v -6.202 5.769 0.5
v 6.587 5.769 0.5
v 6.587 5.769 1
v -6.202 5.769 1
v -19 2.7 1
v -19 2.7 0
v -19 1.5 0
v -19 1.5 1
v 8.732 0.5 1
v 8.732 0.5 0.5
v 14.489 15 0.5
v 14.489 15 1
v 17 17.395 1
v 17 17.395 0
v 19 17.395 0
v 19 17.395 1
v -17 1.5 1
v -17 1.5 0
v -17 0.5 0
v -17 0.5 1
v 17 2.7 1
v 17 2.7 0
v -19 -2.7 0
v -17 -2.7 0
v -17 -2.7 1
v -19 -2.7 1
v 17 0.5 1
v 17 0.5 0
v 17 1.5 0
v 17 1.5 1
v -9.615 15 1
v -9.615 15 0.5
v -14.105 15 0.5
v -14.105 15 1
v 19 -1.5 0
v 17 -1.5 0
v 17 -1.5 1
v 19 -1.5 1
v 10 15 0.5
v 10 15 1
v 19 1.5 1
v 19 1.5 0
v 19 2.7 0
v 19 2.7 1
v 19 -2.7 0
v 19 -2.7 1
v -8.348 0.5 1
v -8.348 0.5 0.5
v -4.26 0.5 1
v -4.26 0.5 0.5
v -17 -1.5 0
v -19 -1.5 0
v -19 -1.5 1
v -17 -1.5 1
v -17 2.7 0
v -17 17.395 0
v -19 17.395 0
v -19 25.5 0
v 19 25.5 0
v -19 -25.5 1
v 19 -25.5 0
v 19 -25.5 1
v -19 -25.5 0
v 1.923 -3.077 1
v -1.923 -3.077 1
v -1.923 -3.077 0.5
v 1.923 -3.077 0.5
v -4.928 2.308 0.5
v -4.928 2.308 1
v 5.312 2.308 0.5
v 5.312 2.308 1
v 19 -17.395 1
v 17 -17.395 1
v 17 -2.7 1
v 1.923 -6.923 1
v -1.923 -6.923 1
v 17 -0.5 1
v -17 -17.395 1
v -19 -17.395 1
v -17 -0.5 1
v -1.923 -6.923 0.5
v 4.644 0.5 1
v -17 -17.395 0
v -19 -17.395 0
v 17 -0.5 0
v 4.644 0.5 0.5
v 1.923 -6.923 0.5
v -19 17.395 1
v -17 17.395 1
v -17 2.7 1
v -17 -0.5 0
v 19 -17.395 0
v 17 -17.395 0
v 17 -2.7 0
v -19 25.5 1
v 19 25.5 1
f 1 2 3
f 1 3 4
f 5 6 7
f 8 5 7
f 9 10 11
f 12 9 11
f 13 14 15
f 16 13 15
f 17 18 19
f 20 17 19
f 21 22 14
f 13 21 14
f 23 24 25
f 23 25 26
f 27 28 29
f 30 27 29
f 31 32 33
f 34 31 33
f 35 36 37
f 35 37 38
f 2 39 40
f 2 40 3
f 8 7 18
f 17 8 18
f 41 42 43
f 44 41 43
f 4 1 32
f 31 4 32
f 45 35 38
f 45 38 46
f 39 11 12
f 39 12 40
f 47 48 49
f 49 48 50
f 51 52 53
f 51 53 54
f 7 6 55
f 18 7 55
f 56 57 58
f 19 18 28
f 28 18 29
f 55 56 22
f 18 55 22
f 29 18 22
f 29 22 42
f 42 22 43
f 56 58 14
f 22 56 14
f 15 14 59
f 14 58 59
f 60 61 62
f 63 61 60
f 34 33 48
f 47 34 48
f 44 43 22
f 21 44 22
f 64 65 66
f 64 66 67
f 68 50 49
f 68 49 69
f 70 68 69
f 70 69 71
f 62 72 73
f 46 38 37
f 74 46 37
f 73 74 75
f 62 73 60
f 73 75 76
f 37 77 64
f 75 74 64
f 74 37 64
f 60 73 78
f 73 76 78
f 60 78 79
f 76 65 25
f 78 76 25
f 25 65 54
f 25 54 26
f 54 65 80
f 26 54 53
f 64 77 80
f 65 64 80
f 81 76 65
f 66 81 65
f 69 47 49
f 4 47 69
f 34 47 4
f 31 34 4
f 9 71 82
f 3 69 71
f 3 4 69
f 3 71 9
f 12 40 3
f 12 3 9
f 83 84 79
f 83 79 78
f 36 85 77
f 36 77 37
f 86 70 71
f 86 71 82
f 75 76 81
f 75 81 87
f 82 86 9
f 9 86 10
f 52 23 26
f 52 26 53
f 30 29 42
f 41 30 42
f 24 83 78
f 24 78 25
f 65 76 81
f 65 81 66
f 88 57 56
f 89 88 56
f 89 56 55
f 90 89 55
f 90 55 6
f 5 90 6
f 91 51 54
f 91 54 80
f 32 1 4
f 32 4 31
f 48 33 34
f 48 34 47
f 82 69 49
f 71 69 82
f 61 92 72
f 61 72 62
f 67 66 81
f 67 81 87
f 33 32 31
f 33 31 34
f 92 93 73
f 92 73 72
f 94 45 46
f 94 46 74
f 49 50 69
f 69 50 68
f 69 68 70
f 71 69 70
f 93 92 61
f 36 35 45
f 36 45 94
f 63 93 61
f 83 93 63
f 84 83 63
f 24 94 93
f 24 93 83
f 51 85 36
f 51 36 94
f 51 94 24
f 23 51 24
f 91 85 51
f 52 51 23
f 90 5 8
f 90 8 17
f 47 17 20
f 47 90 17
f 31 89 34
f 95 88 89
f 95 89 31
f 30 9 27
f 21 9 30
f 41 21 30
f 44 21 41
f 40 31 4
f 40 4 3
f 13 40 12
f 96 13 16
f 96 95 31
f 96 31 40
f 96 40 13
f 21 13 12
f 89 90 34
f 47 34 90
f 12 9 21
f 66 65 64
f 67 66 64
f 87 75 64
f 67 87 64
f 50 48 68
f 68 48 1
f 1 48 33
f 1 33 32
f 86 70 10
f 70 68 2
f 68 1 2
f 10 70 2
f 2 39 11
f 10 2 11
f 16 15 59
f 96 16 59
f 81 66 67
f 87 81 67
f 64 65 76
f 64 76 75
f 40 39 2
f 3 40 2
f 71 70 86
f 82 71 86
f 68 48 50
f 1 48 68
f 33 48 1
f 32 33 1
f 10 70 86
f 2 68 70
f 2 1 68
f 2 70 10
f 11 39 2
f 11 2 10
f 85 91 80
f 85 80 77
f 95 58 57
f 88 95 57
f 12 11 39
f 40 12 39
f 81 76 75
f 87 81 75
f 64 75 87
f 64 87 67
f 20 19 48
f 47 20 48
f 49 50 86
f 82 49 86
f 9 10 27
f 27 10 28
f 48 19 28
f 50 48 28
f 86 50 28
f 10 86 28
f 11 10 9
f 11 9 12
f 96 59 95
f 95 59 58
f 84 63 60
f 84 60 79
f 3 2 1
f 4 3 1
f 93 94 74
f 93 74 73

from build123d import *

# Parameters (mm, degrees)
FLIPS_DEPTH             = 1
FLIPS_2_DEPTH           = 1
NEXT_CUT_START          = 0.5
NEXT_CUT_DEPTH          = 0.5
NEXT_EXTRUDE_START      = 0.5
NEXT_EXTRUDE_DEPTH      = 0.5
PREV_CHAR_W             = 3.846153846
PREV_CHAR_H             = 3.846153846
PREV_CUT_DEPTH          = 0.5
PREV_CHAR_2_W           = 3.846153846
PREV_CHAR_2_H           = 3.846153846
PREV_EXTRUDE_DEPTH      = 0.5
PREV_EXTRUDE_2_DEPTH    = 0.5
CLEANUP_CUT2_DEPTH      = 32.815876543
CLEANUP_CUT2_DEPTH_BACK = 32.815876543
FRONT_CHAR_5_OUTSIDE_W  = 52.722
FRONT_CHAR_5_OUTSIDE_H  = 65.722


# Read off the part's stored shape, not the designer's step: Next_Cut, Next_Extrude
with BuildPart() as part:
    # Front_Char → Flips (new body)
    with BuildSketch(Plane.XY):
        Polygon((19, 1.5), (19, 2.7), (17, 2.7), (17, 17.394721707), (19, 17.394721707), (19, 25.5), (-19, 25.5), (-19, 17.394721707), (-17, 17.394721707), (-17, 2.7), (-19, 2.7), (-19, 1.5), (-17, 1.5), (-17, 0.5), (17, 0.5), (17, 1.5), align=None)
    extrude(amount=FLIPS_DEPTH)

    # Next_Cut outline → Next_Cut (cut)
    with BuildSketch(Plane.XY.offset(NEXT_CUT_START)):
        Polygon((8.732171474, 0.5), (14.489182692, 15), (10, 15), (6.586538462, 5.769230769), (-6.201923077, 5.769230769), (-9.615384615, 15), (-14.104567308, 15), (-8.34755609, 0.5), (-4.2596447, 0.5), (-4.927884615, 2.307692308), (5.3125, 2.307692308), (4.644098575, 0.5), align=None)
    extrude(amount=NEXT_CUT_DEPTH, mode=Mode.SUBTRACT)


with BuildPart() as body_2:
    # Front_Char → Flips 2 (new body)
    with BuildSketch(Plane.XY):
        Polygon((17, -0.5), (17, -1.5), (19, -1.5), (19, -2.7), (17, -2.7), (17, -17.394721707), (19, -17.394721707), (19, -25.5), (-19, -25.5), (-19, -17.394721707), (-17, -17.394721707), (-17, -2.7), (-19, -2.7), (-19, -1.5), (-17, -1.5), (-17, -0.5), align=None)
    extrude(amount=FLIPS_2_DEPTH)

    # Prev_Char → Prev_Cut (cut)
    with BuildSketch(Plane.XY.offset(1)):
        with Locations((0, -5)):
            Rectangle(PREV_CHAR_W, PREV_CHAR_H)
        with BuildLine():
            Line((1.923076923, 15), (1.923076923, 11.153846154))
            Line((1.923076923, 11.153846154), (-1.923076923, 11.153846154))
            Line((-1.923076923, 11.153846154), (-1.923076923, 15))
            add(Edge.make_bspline(
                [(-1.923076923, 15), (-1.914283477, 15.381050549), (-1.897511731, 16.107828482), (-1.760729141, 17.13971916), (-1.535383466, 18.056755761), (-1.21810162, 18.870165784), (-0.781937434, 19.577961225), (-0.245734256, 20.202360907), (0.404415871, 20.737461165), (0.900608511, 21.013146805), (1.153846154, 21.153846154)],
                knots=[0, 0, 0, 0, 1.252840278, 2.389542986, 3.415356866, 4.352460491, 5.24846073, 6.135967884, 7.048669687, 8, 8, 8, 8], degree=3))
            Line((1.153846154, 21.153846154), (1.923076923, 19.591346154))
            add(Edge.make_bspline(
                [(1.923076923, 19.591346154), (1.770942867, 19.496344705), (1.468198769, 19.307293492), (1.083033595, 18.931305848), (0.751943485, 18.50073585), (0.489822241, 17.994020356), (0.290655303, 17.397983725), (0.147350709, 16.699875597), (0.04372328, 15.888255652), (0.023043187, 15.308859313), (0.012019231, 15)],
                knots=[0, 0, 0, 0, 0.822197349, 1.636158272, 2.457375741, 3.30978844, 4.244349105, 5.336795784, 6.580323398, 8, 8, 8, 8], degree=3))
            Line((0.012019231, 15), (1.923076923, 15))
        make_face()
    extrude(amount=-PREV_CUT_DEPTH, mode=Mode.SUBTRACT)


with BuildPart() as body_3:
    # Next_Extrude outline → Next_Extrude (new body)
    with BuildSketch(Plane.XY.offset(NEXT_EXTRUDE_START)):
        Polygon((14.489182692, 15), (10, 15), (6.586538462, 5.769230769), (-6.201923077, 5.769230769), (-9.615384615, 15), (-14.104567308, 15), (-2.193509615, -15), (2.578125, -15), align=None)
        with BuildLine():
            add(Edge.make_bspline(
                [(0.192307692, -11.538461538), (0.307335645, -11.063663008), (0.538313239, -10.110261514), (1.015808404, -8.714356834), (1.570995037, -7.334346462), (2.016925505, -6.445433183), (2.241586538, -5.997596154)],
                knots=[0, 0, 0, 0, 0.247288569, 0.496558596, 0.746364794, 1, 1, 1, 1], degree=3))
            add(Edge.make_bspline(
                [(-2.013221154, -5.576923077), (-1.901483363, -5.88157387), (-1.683014884, -6.477223694), (-1.357212563, -7.342652605), (-1.059564813, -8.164499419), (-0.767696751, -8.930980031), (-0.504222239, -9.653228343), (-0.261371027, -10.326365893), (-0.021193229, -10.945714053), (0.122940847, -11.345876781), (0.192307692, -11.538461538)],
                knots=[0, 0, 0, 0, 0.153148109, 0.299433469, 0.436426351, 0.565670573, 0.68650831, 0.799268516, 0.903394741, 1, 1, 1, 1], degree=3))
            Line((-2.013221154, -5.576923077), (-4.927884615, 2.307692308))
            Line((-4.927884615, 2.307692308), (5.3125, 2.307692308))
            Line((5.3125, 2.307692308), (2.241586538, -5.997596154))
        make_face(mode=Mode.SUBTRACT)
    extrude(amount=NEXT_EXTRUDE_DEPTH)

    # Front_Char<5> outside → CleanUp_Cut2 (cut, two sides: drawn at the far end of the back side and taken through both)
    with BuildSketch(Plane.XY.offset(-CLEANUP_CUT2_DEPTH_BACK)):
        Rectangle(FRONT_CHAR_5_OUTSIDE_W, FRONT_CHAR_5_OUTSIDE_H)
        Polygon((19, 1.5), (19, 2.7), (17, 2.7), (17, 17.394721707), (19, 17.394721707), (19, 25.5), (-19, 25.5), (-19, 17.394721707), (-17, 17.394721707), (-17, 2.7), (-19, 2.7), (-19, 1.5), (-17, 1.5), (-17, 0.5), (17, 0.5), (17, 1.5), align=None, mode=Mode.SUBTRACT)
        Polygon((17, -0.5), (17, -1.5), (19, -1.5), (19, -2.7), (17, -2.7), (17, -17.394721707), (19, -17.394721707), (19, -25.5), (-19, -25.5), (-19, -17.394721707), (-17, -17.394721707), (-17, -2.7), (-19, -2.7), (-19, -1.5), (-17, -1.5), (-17, -0.5), align=None, mode=Mode.SUBTRACT)
    extrude(amount=CLEANUP_CUT2_DEPTH + CLEANUP_CUT2_DEPTH_BACK, mode=Mode.SUBTRACT)


with BuildPart() as body_4:
    # Prev_Char<2> → Prev_Extrude (new body)
    with BuildSketch(Plane.XY.offset(1)):
        with Locations((0, -5)):
            Rectangle(PREV_CHAR_2_W, PREV_CHAR_2_H)
    extrude(amount=-PREV_EXTRUDE_DEPTH)


with BuildPart() as body_5:
    # Prev_Char<2> → Prev_Extrude 2 (new body)
    with BuildSketch(Plane.XY.offset(1)):
        with BuildLine():
            Line((1.923076923, 15), (1.923076923, 11.153846154))
            Line((1.923076923, 11.153846154), (-1.923076923, 11.153846154))
            Line((-1.923076923, 11.153846154), (-1.923076923, 15))
            add(Edge.make_bspline(
                [(-1.923076923, 15), (-1.914283477, 15.381050549), (-1.897511731, 16.107828482), (-1.760729141, 17.13971916), (-1.535383466, 18.056755761), (-1.21810162, 18.870165784), (-0.781937434, 19.577961225), (-0.245734256, 20.202360907), (0.404415871, 20.737461165), (0.900608511, 21.013146805), (1.153846154, 21.153846154)],
                knots=[0, 0, 0, 0, 1.252840278, 2.389542986, 3.415356866, 4.352460491, 5.24846073, 6.135967884, 7.048669687, 8, 8, 8, 8], degree=3))
            Line((1.153846154, 21.153846154), (1.923076923, 19.591346154))
            add(Edge.make_bspline(
                [(1.923076923, 19.591346154), (1.770942867, 19.496344705), (1.468198769, 19.307293492), (1.083033595, 18.931305848), (0.751943485, 18.50073585), (0.489822241, 17.994020356), (0.290655303, 17.397983725), (0.147350709, 16.699875597), (0.04372328, 15.888255652), (0.023043187, 15.308859313), (0.012019231, 15)],
                knots=[0, 0, 0, 0, 0.822197349, 1.636158272, 2.457375741, 3.30978844, 4.244349105, 5.336795784, 6.580323398, 8, 8, 8, 8], degree=3))
            Line((0.012019231, 15), (1.923076923, 15))
        make_face()
    extrude(amount=-PREV_EXTRUDE_2_DEPTH)


with BuildPart() as cleanup_cut2_piece_1:
    # of the separate pieces the step leaves, piece 1, a body of its own (cleanup_cut2_pieces)
    add(body_3.part.solids().sort_by_distance((14.489182692, 15, 0.5))[0])


with BuildPart() as cleanup_cut2_piece_2:
    # of the separate pieces the step leaves, piece 2, a body of its own (cleanup_cut2_pieces)
    add(body_3.part.solids().sort_by_distance((2.578125, -15, 0.5))[0])


solid = Compound([part.part, body_2.part, body_4.part, cleanup_cut2_piece_1.part])
